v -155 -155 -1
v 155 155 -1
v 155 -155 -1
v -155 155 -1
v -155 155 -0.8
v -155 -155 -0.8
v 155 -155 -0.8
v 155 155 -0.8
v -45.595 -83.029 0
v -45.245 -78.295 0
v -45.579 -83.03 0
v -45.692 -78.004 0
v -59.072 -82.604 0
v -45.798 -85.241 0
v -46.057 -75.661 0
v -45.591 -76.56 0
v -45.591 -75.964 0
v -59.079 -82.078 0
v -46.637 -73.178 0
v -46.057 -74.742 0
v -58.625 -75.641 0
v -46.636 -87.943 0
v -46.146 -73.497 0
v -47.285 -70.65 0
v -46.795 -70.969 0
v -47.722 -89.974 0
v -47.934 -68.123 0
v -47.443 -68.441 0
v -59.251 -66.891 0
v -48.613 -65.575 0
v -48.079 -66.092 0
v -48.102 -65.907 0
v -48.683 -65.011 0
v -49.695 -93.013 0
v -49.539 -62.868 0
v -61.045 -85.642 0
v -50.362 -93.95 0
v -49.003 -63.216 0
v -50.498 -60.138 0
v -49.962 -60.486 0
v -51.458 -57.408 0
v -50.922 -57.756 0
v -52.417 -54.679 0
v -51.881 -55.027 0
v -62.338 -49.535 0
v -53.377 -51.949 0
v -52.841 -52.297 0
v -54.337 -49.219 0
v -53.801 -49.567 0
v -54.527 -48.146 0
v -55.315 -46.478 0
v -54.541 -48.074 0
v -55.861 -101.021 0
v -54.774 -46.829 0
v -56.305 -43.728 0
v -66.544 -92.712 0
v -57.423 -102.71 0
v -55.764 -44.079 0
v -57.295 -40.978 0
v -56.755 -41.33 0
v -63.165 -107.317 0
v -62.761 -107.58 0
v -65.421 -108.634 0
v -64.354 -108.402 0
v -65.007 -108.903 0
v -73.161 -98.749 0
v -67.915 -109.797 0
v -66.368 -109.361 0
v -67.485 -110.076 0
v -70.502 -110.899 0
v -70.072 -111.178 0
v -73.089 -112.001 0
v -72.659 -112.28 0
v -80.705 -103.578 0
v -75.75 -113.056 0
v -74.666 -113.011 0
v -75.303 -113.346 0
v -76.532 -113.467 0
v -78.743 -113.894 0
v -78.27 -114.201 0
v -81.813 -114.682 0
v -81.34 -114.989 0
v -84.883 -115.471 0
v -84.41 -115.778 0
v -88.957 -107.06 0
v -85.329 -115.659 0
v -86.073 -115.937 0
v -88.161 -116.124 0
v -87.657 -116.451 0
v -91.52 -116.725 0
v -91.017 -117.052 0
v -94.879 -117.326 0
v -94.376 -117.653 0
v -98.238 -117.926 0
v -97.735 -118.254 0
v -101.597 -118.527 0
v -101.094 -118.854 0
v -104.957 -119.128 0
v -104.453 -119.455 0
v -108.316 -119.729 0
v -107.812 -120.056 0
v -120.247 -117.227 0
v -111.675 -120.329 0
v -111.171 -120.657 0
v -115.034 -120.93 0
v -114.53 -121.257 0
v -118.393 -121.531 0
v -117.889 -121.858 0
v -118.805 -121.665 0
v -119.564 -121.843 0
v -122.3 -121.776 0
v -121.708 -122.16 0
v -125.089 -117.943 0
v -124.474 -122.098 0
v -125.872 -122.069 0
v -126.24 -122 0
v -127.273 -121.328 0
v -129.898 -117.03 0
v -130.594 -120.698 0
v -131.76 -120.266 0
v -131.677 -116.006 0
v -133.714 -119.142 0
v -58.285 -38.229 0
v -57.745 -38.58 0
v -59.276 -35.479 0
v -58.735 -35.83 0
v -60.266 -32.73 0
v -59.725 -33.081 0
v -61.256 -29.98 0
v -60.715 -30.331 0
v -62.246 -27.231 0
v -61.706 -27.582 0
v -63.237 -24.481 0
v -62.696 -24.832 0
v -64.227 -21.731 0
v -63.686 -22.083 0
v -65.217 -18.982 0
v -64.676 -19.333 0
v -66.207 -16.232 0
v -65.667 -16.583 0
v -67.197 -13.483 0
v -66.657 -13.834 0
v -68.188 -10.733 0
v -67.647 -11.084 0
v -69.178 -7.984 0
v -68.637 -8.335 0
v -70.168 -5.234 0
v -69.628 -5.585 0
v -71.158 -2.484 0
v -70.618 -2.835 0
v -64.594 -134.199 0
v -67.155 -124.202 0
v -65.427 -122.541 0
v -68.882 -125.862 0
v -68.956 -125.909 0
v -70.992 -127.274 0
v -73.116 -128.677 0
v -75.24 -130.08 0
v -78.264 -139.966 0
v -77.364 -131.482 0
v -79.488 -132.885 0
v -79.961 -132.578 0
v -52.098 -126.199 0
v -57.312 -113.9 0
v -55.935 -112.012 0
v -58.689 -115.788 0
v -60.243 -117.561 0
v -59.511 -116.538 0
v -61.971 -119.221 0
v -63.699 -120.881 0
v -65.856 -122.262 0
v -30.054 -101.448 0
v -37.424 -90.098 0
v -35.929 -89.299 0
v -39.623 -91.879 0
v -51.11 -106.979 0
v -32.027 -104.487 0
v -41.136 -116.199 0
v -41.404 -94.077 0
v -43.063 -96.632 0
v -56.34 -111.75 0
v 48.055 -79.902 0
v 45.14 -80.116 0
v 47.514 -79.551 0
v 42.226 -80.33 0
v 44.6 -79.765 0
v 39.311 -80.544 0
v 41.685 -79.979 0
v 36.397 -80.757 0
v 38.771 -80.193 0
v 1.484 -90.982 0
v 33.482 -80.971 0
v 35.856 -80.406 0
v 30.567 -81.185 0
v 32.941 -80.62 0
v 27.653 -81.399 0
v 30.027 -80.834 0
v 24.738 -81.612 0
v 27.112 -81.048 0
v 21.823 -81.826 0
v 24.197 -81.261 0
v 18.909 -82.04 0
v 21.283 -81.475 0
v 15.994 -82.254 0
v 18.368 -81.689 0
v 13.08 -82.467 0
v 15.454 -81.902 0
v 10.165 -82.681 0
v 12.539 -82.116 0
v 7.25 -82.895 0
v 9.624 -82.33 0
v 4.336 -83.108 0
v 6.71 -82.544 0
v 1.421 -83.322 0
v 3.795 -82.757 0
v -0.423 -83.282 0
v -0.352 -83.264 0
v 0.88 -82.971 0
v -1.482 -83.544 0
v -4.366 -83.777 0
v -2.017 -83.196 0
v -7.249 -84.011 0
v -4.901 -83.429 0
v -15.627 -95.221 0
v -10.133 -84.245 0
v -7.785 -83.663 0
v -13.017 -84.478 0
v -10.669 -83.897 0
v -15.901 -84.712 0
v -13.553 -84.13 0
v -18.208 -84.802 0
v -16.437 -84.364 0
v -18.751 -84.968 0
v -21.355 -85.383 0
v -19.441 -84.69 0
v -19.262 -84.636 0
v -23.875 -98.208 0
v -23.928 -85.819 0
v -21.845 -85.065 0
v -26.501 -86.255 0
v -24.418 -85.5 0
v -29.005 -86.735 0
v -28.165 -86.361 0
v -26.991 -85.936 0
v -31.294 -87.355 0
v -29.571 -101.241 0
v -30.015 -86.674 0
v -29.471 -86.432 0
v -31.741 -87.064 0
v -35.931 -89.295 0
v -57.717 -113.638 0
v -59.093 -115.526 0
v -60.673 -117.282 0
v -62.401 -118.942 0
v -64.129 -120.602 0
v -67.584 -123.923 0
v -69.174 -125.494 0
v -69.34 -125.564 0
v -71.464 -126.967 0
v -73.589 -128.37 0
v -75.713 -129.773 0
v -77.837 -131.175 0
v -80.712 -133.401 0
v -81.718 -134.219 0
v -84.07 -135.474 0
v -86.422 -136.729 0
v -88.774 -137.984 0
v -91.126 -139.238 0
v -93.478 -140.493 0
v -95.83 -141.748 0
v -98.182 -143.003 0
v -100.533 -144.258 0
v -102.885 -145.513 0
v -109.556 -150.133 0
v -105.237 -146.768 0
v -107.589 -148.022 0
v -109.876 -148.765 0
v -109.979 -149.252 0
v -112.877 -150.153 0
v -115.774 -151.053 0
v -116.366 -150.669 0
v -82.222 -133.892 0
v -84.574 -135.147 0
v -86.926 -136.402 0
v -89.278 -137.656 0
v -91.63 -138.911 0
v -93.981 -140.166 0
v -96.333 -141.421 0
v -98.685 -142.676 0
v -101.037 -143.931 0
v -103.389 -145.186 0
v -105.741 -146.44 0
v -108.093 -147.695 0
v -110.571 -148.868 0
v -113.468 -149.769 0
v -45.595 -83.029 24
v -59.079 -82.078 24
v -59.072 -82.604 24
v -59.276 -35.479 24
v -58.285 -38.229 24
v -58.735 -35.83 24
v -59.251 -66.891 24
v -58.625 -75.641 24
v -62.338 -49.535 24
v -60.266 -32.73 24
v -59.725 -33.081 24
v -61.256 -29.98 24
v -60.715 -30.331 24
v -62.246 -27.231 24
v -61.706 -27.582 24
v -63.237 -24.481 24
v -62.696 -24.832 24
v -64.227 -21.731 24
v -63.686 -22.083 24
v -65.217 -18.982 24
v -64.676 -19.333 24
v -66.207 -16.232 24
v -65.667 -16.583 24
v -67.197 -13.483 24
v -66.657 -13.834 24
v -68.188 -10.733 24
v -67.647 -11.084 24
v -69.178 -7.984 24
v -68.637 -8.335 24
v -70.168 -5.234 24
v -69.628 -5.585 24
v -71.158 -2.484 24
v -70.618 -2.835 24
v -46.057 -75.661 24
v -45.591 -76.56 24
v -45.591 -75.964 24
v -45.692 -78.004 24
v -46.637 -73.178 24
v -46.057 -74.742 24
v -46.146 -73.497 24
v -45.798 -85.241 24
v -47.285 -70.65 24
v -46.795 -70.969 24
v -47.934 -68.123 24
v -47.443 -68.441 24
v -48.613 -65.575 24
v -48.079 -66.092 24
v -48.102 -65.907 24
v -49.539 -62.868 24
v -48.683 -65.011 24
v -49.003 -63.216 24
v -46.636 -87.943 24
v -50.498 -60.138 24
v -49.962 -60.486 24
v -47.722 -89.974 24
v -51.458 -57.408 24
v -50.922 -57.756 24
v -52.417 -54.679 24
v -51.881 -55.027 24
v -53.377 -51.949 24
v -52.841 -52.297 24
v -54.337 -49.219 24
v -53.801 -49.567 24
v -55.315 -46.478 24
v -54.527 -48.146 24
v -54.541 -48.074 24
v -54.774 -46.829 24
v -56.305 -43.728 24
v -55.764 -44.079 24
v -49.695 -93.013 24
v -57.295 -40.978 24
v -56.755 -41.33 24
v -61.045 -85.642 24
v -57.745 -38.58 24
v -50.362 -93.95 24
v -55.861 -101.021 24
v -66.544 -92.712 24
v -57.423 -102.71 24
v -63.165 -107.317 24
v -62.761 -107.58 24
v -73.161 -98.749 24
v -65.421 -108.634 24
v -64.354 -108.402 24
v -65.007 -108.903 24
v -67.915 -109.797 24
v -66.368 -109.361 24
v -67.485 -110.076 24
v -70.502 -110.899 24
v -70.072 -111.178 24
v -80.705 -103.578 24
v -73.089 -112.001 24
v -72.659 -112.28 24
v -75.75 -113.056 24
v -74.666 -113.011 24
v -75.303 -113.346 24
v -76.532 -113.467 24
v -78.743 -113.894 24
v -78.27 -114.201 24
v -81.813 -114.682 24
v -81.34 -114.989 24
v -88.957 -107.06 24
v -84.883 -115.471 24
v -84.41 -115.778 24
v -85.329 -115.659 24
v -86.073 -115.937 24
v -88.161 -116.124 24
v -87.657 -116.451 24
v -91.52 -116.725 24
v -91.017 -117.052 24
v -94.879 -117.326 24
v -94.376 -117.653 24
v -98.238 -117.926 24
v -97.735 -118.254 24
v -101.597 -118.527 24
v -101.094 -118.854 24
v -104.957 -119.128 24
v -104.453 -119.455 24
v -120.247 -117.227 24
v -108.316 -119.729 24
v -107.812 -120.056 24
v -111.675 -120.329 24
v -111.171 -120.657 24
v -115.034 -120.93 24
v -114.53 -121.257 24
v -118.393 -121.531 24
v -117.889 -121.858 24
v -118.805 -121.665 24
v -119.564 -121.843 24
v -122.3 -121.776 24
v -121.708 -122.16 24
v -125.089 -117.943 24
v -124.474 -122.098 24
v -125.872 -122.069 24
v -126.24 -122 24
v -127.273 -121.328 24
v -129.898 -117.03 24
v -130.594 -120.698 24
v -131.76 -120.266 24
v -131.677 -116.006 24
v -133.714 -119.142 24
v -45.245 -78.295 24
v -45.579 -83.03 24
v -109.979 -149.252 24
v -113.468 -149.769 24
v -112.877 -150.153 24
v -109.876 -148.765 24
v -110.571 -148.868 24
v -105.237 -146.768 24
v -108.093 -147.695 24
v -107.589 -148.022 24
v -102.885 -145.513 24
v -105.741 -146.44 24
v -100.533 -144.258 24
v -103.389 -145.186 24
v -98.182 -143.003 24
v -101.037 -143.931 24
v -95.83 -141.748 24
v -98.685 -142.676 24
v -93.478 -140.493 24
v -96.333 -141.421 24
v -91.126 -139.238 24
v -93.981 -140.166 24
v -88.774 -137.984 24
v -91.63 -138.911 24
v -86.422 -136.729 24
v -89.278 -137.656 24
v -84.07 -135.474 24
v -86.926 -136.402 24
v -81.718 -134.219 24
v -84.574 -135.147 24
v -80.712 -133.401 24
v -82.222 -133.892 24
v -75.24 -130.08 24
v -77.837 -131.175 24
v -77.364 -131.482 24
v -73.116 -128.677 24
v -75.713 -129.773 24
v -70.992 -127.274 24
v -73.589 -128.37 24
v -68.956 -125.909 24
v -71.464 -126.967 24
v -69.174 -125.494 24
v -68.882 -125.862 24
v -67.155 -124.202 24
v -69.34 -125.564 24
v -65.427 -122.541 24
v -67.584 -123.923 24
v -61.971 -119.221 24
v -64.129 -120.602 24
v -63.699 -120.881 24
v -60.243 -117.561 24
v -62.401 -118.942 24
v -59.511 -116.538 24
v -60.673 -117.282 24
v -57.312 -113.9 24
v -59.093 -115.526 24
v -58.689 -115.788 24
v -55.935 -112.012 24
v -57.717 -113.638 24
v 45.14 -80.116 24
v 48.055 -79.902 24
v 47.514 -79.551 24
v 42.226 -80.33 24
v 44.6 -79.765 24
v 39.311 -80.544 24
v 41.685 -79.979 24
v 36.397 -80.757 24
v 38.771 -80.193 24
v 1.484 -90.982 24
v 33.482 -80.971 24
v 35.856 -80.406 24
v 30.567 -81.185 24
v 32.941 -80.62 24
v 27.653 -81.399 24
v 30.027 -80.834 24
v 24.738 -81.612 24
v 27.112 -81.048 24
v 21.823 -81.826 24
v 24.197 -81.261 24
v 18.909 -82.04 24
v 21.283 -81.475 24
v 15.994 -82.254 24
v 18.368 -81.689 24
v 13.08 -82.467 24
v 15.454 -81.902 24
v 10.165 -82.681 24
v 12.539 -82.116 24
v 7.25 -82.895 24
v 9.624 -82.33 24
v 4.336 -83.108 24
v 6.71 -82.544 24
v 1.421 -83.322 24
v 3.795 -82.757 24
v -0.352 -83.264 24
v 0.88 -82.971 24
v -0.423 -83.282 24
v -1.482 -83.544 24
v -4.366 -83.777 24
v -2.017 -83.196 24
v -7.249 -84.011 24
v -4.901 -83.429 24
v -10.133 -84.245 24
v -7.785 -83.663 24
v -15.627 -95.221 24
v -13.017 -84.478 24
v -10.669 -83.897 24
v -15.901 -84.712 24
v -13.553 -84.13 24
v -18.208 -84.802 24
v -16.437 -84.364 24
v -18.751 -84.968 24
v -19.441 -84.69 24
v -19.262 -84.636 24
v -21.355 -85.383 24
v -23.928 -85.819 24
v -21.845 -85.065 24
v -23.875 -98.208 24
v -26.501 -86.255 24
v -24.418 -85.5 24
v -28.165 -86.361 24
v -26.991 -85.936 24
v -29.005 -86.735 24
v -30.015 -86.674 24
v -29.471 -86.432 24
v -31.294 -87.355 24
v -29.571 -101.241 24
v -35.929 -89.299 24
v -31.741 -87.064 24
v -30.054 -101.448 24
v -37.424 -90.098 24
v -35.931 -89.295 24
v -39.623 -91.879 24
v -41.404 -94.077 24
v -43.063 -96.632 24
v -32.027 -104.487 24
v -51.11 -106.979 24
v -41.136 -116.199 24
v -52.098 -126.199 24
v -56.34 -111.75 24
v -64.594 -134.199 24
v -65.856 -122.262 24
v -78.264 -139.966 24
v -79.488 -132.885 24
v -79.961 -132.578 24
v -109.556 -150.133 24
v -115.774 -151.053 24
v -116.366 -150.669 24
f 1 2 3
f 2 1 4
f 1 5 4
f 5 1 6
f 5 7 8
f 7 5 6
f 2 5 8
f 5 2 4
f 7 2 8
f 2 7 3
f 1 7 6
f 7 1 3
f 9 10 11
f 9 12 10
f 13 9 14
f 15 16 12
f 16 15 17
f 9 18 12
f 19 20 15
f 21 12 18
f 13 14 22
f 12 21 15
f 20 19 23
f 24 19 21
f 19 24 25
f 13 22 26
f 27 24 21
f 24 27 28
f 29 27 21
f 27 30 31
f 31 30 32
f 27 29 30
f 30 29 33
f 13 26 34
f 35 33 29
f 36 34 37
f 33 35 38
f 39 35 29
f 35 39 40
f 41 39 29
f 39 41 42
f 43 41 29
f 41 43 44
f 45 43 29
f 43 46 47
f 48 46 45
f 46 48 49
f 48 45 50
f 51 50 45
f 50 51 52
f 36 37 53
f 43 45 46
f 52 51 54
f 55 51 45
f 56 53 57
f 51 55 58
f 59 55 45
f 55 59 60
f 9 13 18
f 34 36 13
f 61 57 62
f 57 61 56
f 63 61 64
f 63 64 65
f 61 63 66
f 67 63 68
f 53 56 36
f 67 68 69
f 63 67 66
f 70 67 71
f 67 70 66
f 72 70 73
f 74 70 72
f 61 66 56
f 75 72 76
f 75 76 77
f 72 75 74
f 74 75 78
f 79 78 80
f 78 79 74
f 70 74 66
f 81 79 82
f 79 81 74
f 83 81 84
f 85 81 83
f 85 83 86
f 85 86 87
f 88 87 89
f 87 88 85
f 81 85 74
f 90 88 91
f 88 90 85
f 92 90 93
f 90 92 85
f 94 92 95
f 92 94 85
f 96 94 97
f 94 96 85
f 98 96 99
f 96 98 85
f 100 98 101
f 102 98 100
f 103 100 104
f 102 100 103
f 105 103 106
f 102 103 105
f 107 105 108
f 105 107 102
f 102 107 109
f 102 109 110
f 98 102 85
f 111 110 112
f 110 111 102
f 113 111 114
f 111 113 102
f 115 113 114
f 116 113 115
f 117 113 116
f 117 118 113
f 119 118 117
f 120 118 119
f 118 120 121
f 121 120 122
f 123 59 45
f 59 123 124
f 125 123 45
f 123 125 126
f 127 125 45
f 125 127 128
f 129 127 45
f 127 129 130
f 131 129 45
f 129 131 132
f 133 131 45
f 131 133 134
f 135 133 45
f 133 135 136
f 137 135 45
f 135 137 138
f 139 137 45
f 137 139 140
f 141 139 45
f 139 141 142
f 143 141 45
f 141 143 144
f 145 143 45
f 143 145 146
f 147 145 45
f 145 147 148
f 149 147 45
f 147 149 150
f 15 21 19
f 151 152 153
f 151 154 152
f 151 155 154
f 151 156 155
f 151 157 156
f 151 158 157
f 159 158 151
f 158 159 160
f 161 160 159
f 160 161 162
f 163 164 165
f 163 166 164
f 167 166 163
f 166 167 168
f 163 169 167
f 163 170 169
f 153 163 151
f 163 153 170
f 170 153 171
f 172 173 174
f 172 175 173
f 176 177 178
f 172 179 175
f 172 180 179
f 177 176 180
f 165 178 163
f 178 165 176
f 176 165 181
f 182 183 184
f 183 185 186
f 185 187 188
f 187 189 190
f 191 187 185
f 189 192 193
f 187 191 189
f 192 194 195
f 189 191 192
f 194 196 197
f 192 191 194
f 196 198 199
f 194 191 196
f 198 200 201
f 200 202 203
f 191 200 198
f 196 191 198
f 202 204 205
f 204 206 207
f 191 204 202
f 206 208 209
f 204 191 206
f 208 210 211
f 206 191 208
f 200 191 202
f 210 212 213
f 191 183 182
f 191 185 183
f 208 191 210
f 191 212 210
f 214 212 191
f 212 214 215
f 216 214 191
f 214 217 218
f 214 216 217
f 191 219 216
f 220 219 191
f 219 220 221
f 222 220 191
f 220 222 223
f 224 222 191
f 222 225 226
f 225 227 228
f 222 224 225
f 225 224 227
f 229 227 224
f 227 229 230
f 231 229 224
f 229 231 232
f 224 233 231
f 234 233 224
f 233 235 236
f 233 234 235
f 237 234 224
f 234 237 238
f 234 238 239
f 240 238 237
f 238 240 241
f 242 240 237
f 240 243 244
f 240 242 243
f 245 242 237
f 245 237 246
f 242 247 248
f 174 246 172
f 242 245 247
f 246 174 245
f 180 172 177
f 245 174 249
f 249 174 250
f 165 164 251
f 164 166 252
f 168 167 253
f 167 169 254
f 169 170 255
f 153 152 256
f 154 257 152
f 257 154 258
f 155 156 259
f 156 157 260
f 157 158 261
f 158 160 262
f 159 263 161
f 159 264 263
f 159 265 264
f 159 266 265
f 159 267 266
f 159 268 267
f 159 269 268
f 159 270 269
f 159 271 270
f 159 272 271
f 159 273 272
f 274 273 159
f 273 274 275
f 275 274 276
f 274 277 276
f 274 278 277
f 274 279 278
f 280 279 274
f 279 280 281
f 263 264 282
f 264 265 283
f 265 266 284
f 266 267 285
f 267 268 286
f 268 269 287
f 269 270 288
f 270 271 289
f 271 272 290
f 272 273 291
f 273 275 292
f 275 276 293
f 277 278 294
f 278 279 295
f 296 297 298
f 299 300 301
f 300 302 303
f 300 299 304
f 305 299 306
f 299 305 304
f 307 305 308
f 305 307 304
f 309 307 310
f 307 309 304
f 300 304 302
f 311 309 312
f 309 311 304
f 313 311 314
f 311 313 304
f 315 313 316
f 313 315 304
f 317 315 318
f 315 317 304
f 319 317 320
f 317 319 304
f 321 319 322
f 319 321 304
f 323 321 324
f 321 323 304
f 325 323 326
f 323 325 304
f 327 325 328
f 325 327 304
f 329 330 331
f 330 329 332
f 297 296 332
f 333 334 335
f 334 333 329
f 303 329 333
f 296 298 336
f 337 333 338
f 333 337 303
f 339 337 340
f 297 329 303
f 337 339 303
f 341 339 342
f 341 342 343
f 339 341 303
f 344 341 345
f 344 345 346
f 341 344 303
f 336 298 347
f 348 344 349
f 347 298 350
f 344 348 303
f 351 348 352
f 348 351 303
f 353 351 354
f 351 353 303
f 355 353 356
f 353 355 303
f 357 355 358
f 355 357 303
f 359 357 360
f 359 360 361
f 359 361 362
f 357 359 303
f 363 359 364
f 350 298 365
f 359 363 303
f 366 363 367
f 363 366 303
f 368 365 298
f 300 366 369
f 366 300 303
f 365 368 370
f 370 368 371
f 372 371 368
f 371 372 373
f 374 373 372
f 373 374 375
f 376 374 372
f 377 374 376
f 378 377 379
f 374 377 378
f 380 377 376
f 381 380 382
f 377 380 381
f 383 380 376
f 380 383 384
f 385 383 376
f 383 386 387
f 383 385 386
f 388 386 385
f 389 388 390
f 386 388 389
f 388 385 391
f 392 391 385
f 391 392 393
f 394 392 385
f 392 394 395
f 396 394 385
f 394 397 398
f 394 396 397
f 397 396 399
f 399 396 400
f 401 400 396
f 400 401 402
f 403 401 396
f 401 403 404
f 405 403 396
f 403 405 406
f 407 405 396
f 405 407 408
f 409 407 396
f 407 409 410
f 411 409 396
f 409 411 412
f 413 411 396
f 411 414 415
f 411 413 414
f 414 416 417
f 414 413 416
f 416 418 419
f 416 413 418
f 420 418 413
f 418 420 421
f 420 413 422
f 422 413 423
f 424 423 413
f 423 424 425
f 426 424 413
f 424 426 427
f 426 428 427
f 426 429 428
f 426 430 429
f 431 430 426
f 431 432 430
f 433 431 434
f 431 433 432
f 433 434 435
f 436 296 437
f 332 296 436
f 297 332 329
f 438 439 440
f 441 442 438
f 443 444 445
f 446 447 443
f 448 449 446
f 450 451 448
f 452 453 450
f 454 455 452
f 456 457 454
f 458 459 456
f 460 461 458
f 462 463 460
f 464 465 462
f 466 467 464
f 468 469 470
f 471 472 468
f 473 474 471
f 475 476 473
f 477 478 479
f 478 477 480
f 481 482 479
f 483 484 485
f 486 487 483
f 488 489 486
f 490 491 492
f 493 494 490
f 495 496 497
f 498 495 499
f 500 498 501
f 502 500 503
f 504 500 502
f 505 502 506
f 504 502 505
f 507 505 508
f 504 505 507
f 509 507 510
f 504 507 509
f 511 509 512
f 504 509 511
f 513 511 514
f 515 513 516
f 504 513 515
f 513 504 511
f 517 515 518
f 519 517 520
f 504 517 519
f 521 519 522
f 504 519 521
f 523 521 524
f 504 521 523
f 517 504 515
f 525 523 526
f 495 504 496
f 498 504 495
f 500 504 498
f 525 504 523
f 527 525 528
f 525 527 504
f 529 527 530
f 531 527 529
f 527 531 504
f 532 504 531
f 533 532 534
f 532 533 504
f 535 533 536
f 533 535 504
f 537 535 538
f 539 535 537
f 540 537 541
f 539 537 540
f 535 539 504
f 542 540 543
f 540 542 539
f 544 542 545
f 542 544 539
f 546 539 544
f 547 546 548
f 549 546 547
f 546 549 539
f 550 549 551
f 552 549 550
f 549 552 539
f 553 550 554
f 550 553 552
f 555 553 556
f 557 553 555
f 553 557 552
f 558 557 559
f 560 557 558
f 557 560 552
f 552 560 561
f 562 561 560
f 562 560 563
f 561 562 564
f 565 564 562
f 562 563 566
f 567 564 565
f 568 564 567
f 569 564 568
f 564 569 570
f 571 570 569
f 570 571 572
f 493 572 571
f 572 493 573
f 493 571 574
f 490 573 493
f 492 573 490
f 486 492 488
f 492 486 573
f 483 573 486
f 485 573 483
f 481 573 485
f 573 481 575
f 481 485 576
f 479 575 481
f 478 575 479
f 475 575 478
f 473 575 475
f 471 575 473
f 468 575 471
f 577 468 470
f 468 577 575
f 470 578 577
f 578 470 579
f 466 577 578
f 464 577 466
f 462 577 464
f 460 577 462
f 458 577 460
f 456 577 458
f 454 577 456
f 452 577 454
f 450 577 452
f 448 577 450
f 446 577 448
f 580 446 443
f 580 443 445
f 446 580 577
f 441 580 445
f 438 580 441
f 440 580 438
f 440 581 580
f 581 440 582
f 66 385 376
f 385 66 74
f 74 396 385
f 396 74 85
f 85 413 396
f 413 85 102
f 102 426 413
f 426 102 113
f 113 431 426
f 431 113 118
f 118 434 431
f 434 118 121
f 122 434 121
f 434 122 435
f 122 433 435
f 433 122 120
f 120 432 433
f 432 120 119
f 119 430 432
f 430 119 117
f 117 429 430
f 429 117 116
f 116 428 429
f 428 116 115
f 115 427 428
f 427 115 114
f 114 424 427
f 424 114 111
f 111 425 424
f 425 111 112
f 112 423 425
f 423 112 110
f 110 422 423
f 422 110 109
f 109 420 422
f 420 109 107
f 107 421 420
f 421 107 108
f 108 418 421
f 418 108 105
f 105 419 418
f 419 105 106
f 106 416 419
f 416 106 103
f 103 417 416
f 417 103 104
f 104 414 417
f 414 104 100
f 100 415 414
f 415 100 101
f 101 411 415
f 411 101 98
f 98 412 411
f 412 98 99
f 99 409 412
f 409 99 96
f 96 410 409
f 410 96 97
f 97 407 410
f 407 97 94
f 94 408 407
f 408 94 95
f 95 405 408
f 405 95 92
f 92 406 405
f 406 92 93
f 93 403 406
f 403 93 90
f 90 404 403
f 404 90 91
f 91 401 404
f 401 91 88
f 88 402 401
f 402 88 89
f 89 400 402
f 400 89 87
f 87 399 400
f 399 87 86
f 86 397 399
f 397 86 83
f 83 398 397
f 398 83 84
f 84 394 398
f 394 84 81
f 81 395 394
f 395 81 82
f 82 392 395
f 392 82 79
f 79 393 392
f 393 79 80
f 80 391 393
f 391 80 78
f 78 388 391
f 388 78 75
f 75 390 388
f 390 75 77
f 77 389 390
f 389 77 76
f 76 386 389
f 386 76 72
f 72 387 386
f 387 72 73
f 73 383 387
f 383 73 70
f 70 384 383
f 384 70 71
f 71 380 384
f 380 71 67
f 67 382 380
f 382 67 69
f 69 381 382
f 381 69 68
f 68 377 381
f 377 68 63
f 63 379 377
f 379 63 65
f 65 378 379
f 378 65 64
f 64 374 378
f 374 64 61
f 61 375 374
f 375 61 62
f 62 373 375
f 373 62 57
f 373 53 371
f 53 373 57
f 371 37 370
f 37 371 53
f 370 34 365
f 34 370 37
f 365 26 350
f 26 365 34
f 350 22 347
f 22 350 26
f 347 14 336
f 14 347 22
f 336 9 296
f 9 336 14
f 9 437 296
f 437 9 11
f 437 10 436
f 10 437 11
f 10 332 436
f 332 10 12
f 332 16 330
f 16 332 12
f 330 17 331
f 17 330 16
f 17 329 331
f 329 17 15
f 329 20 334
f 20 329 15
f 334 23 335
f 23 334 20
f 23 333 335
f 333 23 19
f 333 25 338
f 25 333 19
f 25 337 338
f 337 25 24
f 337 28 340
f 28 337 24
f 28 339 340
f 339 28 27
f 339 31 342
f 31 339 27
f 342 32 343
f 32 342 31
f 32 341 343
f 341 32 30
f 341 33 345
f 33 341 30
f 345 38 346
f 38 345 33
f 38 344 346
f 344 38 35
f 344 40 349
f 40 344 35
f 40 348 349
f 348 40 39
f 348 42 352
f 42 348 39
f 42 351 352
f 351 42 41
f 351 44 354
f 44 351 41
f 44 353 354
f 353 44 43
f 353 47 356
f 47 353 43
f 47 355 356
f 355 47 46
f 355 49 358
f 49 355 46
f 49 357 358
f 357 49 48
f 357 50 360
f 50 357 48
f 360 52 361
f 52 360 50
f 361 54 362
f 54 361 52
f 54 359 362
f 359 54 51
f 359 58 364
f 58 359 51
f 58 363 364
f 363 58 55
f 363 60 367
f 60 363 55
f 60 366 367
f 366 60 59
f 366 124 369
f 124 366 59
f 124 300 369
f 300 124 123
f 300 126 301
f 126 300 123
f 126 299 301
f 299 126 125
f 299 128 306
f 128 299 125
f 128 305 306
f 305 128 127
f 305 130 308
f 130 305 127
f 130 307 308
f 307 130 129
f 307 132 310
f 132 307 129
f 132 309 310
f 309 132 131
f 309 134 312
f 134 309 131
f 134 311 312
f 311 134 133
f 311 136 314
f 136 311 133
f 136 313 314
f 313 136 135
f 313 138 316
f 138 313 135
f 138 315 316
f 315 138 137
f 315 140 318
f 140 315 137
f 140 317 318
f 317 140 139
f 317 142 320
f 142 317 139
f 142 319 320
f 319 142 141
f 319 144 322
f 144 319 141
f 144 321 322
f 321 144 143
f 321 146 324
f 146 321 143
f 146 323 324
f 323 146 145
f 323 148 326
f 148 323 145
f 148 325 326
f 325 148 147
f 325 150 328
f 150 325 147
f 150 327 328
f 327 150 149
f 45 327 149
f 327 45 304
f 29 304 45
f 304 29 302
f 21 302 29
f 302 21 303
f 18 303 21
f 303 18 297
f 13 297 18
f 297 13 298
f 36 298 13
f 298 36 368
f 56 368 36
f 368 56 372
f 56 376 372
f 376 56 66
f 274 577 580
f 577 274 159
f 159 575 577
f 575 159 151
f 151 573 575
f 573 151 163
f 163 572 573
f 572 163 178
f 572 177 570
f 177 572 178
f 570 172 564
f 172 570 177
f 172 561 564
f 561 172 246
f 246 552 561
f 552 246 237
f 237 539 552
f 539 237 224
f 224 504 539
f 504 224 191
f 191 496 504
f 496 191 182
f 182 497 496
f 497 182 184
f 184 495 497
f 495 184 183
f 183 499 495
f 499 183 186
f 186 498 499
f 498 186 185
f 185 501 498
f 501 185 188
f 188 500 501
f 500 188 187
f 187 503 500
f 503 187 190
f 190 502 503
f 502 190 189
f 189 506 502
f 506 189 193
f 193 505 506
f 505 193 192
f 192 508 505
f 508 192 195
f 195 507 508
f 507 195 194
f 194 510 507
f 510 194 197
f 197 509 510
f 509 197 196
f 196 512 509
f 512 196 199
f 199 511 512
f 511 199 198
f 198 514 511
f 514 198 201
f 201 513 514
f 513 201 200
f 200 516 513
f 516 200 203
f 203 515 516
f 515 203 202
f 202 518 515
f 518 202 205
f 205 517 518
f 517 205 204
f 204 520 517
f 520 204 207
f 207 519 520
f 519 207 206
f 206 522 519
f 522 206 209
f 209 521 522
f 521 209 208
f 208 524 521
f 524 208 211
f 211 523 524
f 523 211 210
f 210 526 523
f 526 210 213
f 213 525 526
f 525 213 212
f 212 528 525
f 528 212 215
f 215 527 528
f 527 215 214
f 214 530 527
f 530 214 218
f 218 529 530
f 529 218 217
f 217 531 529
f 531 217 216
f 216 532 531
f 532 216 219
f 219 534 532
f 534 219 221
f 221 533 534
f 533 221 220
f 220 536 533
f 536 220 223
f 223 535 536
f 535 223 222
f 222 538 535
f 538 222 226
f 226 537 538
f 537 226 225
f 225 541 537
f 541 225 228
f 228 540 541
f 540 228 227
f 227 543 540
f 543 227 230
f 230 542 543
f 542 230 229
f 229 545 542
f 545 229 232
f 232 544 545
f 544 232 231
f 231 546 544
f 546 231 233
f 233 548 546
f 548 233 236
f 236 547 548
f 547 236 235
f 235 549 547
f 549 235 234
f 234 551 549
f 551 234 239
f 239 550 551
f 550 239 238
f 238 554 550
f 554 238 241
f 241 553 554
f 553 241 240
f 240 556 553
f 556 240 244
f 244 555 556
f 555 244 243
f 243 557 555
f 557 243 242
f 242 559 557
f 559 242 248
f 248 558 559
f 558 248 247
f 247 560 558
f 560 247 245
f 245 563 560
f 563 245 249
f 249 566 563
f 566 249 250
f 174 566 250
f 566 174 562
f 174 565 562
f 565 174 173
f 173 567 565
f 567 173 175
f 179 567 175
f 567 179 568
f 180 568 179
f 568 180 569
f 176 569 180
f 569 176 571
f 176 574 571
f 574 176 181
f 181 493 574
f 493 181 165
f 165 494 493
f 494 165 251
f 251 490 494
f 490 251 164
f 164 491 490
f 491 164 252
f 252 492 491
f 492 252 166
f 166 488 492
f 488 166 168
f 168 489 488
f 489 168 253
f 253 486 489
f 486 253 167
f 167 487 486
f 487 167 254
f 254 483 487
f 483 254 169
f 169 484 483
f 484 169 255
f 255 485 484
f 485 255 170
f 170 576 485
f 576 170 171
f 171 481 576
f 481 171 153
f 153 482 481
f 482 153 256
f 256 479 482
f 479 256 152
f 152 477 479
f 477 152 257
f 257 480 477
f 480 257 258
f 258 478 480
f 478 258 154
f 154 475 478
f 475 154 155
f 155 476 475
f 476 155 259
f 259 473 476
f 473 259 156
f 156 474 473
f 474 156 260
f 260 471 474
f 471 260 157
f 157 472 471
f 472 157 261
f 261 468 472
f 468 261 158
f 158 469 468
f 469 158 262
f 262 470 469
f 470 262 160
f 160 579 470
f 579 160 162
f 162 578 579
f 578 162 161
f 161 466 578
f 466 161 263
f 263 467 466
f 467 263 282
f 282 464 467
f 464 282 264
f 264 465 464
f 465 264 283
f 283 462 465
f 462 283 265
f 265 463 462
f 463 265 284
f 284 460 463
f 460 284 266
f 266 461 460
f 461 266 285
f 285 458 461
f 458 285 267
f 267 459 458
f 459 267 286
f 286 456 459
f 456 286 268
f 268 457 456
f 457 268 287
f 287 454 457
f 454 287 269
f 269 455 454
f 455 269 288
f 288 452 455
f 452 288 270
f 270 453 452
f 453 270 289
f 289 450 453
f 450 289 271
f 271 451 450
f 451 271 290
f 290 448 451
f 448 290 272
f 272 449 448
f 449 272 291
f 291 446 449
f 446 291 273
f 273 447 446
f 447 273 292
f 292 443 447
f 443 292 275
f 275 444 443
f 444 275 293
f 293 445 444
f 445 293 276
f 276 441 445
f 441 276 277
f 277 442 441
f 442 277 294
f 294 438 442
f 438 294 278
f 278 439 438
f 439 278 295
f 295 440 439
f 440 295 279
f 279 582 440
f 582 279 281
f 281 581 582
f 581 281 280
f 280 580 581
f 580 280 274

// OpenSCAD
// file: paddle_mel.scad
mark_number = 8;
layer = 0.16;

// Parameters for the overall shape.
width = 199.5;
fan_length = 232;
fan_roundoff = 80;

// The length of the flat striking surface, before it hits the grip
// shelf. This is the part that has a tapered "wedge" shape.
wedge_length = 257;

bridge_grip_overlap = 20;

// Make a wedge shape.
function max_thickness() = 24;
function min_thickness() = 7.9;

grip_width = 34.6;

bridge_length = wedge_length + bridge_grip_overlap - fan_length;

wedge_angle = atan(
  (max_thickness() - min_thickness()) / (2 * wedge_length));
  
// Default values.
$grip_offs = 0;

function bulge_radius(thickness, intercept_angle) =
  thickness / (2 * sin(intercept_angle));

module chain() {
  if ($children >= 2)
  for (i = [0:$children-2])
  hull() {
    children(i);
    children(i+1);
  }
}

module bulge_piece(r) {
  // A 1/8th slice of a sphere.
  translate([-r, -r])
  rotate_extrude($fn=16, angle=90)
  intersection() {
    circle($fn=24, r=r);
    
    translate([r, r])
    square(r*2, center=true);
  }
}

module fan_piece(flip, x, y, gentle_curve=false) {
  y_frac = y/wedge_length;
  thickness = (1 - y_frac)*max_thickness() + y_frac*min_thickness();

  intersection() {
    for (a = [-1, 1])   
    for (b = [-1, 1]) {
      gentle_factor = gentle_curve ? 0.86 : 1;
      
      scale([a, 1, b])
      translate([x, y])
      scale([1, flip ? -1 : 1])
      scale([1, 1, gentle_factor])
      bulge_piece(bulge_radius(thickness, 45));
    }
    
    // Chop off anything that goes above the max_thickness. This avoids
    // flattening the gentle_top_curve when hull'ing with a taller piece.
    translate([-400, -400, max_thickness()/2-100])
    cube([800, 800, 101]);
  }
}

module fan(base_only=false) {  
  hull()
  for (angle = [0:10:90]) {
    x = width/2 + fan_roundoff*(sin(angle)-1);
    
    // Top edges.
    if (!base_only)
    fan_piece(false, x,
      wedge_length + fan_roundoff*(cos(angle)-1));
    
    // Bottom edges.
    if (angle >= 50)
    fan_piece(true, x,
      wedge_length - fan_length + fan_roundoff*(1-cos(angle)));
  }
}

// `i` should be in the range [0, 3].
module bridge(i) {
  x_frac = [0.31, 0.166, 0.074, 0.02][i];
  y_frac = [0.28, 0.57, 0.8, 0.985][i];

  fan_piece(
    true,
    grip_width/2 + x_frac*0.5*(width-grip_width),
    bridge_length*(1-y_frac) - bridge_grip_overlap,
    gentle_curve=(i>=3)
  );
}

module wedge() {
  difference() {
    // "Unwedge" the piece, so that one surface coincides with the xy-plane.
    rotate([-wedge_angle, 0, 0])
    translate([0, 0, max_thickness()/2])
    difference() {
      union() {
        fan();
        
        chain() {
          fan(base_only=true);
          bridge(0);
          bridge(1);
          bridge(2);
          bridge(3);
        }
      }   
    
      // Cut in the wedge surface.
      for (a = [-1, 1])
      scale([1, 1, a])
      translate([0, 0, max_thickness()/2])
      rotate([-wedge_angle, 0, 0])
      translate([0, 0, 20])
      cube([width, 600, 40], center=true);
    }

    // Flatten the stem that intersects with the grip.
    translate([-100, -100, max_thickness()])
    cube([200, 200, 10]);
  }
}

module wedge_top_cut() {
  rotate([-wedge_angle, 0, 0])
  translate([0, 0, max_thickness()])
  rotate([-wedge_angle, 0, 0])
  translate([0, 0, 20])
  cube([width, 600, 40], center=true);
}

module grip_2d() {
  flats = 11;
  
  offset(delta=$grip_offs)
  intersection() {
    // Main profile, rounded on both sides.
    hull()
    for (a = [-1, 1])
    scale([1, a])
    translate([0, flats/2])
    scale([grip_width/2, (1.12*max_thickness() - flats)/2])
    circle($fn=18, r=1);
    
    // Cut off to meet the build plate.
    translate([-30, max_thickness()/2 - max_thickness()])
    square([60, max_thickness()]);
  }
}

module rotate_up(ra) {
  r = ra[0];
  a = ra[1];
  translate([r, 0])
  rotate([0, a, 0])
  translate([-r, 0])
  children();
}

module rotate_up_extrude(ra) {
  r = ra[0];
  a = ra[1];
  rotate([-90, 0])
  translate([r, 0])
  rotate_extrude(angle=a)
  translate([-r, 0])
  children();
}

module linear_extrude_eps(h) {
  eps = 0.001;
  translate([0, 0, -eps])
  linear_extrude(h + 2*eps)
  children();
}

knurl_groove_layers = 3;

// Width of the three steps, from deepest to shallowest.
knurl_groove_widths = [1.2, 1.7, 2.2];

module knurling_rays(groove_width, max_a=80) {
  translate([-100, 0, -0.001])
  for (a = [8.5:3.3:max_a])
  rotate([0, 0, -a])
  translate([0, -groove_width/2, 0])
  cube([200, groove_width, max_thickness() + 0.002]);
}

module grip() {
  $fn = 40;
  
  straight1 = 12;
  elbow1 = [70, 39];
  straight2 = 32.9;
  
  difference() {
    translate([0, 0, max_thickness()/2])
    rotate([90, 0, 0]) {
      // Add some length to make sure the grip smoothly meets the wedge. This
      // also makes the bottom axial groove extend into the wedge a bit,
      // avoiding correlated weak areas.
      straight_extension = 18;
      translate([0, 0, -straight_extension])
      linear_extrude_eps(straight1 + straight_extension) grip_2d();
            
      translate([0, 0, straight1])
      scale([-1, 1]) {
        rotate_up_extrude(elbow1) grip_2d();

        rotate_up(elbow1) {
          linear_extrude_eps(straight2) grip_2d();
          
          translate([0, 0, straight2])
          intersection() {
            // The final elbow is the intersection of two different
            // extrusions, which lets us taper the end.
            rotate_up_extrude([32, 115], $fn=19) grip_2d();
            
            tight_r = 14;
            rotate_up_extrude([tight_r, 180], $fn=22)
            intersection() {
              grip_2d();
              // Avoid a negative x-coordinate for the tight
              // rotate_extrude.
              translate([tight_r-grip_width/2, 0])
              square(grip_width, center=true);
            }
          }
        }
      }
    }
    
    // Cut the part of the grip that would protrude above the hitting
    // surface.
    wedge_top_cut();
  }
}

module knurled_grip() {
  // Bottom of the grooves.
  grip($grip_offs=-knurl_groove_layers*layer);

  // Stair steps.
  for (i = [0:knurl_groove_layers-1])
  difference() {
    grip($grip_offs=-layer*(knurl_groove_layers-1-i));
    knurling_rays(knurl_groove_widths[i]);
  }
}

module unibody() {
  difference() {
    color("cyan")
    wedge();
    
    // Cut the same knurling grooves into the fillet, to match the grip knurling
    // grooves.
    for (i = [0:knurl_groove_layers-1])
    for (a = [-1, 1])
    translate([0, 0, a * (max_thickness() - layer*(knurl_groove_layers-i))])
    knurling_rays(knurl_groove_widths[i], max_a=35);
  }

  difference() {
    knurled_grip();

    // Mark number.
    translate([-60, -99.2, 4.8]) // TUNED
    rotate([90, 0, -15])
    linear_extrude(10)
    offset(delta=0.7)
    text(str(mark_number), size=14.5);
  }
  
  // Make the knurl grooves slightly shallower on the top and
  // bottom surfaces, for a more continuous sheet.
  intersection() {
    grip($grip_offs=layer*(1-knurl_groove_layers));

    for(z = [0, max_thickness()])
    translate([0, 0, z])
    cube([500, 500, knurl_groove_layers*layer*2], center=true);
  }
}

// Position on the Neptune 4 Plus build plate.
module print_position() {
  translate([-40, -85])
  rotate([0, 0, -33])
  children();
}

// A large square that defines the model's bounding box. This helps Orca
// to place all of the modifiers in the proper alignment.
module positioning_square() {
  translate([0, 0, -1])
  linear_extrude(0.2)
  square(310, center=true);
}

unibody();
// main file
use <paddle_mel.scad>

module paddle_profile(inset) {
  offset(-inset)
  projection() {
    wedge();
    grip();
  }
}

module strake(width, top, bottom) {
  difference() {
    paddle_profile(0);
    paddle_profile(width);
    
    translate([-200, top]) square(400);
    translate([-200, -bottom-400]) square(400);
    
    // Don't add any material to the hooked part; it is not under
    // high stress.
    translate([-260, -200]) square(200);
  }
}

module strakes_2d() {
  steps = 30;
  for (i = [0:steps-1])
  strake(14*i/steps, 54-53*i/steps, 99-70*i/steps);
}

module preview() {
  color("cyan")
  translate([0, 0, -2])
  linear_extrude(1)
  paddle_profile(0);
  
  strakes_2d();
}

module strakes() {
  linear_extrude(max_thickness())
  strakes_2d();
}

color("cyan")
positioning_square();

print_position()
strakes();
